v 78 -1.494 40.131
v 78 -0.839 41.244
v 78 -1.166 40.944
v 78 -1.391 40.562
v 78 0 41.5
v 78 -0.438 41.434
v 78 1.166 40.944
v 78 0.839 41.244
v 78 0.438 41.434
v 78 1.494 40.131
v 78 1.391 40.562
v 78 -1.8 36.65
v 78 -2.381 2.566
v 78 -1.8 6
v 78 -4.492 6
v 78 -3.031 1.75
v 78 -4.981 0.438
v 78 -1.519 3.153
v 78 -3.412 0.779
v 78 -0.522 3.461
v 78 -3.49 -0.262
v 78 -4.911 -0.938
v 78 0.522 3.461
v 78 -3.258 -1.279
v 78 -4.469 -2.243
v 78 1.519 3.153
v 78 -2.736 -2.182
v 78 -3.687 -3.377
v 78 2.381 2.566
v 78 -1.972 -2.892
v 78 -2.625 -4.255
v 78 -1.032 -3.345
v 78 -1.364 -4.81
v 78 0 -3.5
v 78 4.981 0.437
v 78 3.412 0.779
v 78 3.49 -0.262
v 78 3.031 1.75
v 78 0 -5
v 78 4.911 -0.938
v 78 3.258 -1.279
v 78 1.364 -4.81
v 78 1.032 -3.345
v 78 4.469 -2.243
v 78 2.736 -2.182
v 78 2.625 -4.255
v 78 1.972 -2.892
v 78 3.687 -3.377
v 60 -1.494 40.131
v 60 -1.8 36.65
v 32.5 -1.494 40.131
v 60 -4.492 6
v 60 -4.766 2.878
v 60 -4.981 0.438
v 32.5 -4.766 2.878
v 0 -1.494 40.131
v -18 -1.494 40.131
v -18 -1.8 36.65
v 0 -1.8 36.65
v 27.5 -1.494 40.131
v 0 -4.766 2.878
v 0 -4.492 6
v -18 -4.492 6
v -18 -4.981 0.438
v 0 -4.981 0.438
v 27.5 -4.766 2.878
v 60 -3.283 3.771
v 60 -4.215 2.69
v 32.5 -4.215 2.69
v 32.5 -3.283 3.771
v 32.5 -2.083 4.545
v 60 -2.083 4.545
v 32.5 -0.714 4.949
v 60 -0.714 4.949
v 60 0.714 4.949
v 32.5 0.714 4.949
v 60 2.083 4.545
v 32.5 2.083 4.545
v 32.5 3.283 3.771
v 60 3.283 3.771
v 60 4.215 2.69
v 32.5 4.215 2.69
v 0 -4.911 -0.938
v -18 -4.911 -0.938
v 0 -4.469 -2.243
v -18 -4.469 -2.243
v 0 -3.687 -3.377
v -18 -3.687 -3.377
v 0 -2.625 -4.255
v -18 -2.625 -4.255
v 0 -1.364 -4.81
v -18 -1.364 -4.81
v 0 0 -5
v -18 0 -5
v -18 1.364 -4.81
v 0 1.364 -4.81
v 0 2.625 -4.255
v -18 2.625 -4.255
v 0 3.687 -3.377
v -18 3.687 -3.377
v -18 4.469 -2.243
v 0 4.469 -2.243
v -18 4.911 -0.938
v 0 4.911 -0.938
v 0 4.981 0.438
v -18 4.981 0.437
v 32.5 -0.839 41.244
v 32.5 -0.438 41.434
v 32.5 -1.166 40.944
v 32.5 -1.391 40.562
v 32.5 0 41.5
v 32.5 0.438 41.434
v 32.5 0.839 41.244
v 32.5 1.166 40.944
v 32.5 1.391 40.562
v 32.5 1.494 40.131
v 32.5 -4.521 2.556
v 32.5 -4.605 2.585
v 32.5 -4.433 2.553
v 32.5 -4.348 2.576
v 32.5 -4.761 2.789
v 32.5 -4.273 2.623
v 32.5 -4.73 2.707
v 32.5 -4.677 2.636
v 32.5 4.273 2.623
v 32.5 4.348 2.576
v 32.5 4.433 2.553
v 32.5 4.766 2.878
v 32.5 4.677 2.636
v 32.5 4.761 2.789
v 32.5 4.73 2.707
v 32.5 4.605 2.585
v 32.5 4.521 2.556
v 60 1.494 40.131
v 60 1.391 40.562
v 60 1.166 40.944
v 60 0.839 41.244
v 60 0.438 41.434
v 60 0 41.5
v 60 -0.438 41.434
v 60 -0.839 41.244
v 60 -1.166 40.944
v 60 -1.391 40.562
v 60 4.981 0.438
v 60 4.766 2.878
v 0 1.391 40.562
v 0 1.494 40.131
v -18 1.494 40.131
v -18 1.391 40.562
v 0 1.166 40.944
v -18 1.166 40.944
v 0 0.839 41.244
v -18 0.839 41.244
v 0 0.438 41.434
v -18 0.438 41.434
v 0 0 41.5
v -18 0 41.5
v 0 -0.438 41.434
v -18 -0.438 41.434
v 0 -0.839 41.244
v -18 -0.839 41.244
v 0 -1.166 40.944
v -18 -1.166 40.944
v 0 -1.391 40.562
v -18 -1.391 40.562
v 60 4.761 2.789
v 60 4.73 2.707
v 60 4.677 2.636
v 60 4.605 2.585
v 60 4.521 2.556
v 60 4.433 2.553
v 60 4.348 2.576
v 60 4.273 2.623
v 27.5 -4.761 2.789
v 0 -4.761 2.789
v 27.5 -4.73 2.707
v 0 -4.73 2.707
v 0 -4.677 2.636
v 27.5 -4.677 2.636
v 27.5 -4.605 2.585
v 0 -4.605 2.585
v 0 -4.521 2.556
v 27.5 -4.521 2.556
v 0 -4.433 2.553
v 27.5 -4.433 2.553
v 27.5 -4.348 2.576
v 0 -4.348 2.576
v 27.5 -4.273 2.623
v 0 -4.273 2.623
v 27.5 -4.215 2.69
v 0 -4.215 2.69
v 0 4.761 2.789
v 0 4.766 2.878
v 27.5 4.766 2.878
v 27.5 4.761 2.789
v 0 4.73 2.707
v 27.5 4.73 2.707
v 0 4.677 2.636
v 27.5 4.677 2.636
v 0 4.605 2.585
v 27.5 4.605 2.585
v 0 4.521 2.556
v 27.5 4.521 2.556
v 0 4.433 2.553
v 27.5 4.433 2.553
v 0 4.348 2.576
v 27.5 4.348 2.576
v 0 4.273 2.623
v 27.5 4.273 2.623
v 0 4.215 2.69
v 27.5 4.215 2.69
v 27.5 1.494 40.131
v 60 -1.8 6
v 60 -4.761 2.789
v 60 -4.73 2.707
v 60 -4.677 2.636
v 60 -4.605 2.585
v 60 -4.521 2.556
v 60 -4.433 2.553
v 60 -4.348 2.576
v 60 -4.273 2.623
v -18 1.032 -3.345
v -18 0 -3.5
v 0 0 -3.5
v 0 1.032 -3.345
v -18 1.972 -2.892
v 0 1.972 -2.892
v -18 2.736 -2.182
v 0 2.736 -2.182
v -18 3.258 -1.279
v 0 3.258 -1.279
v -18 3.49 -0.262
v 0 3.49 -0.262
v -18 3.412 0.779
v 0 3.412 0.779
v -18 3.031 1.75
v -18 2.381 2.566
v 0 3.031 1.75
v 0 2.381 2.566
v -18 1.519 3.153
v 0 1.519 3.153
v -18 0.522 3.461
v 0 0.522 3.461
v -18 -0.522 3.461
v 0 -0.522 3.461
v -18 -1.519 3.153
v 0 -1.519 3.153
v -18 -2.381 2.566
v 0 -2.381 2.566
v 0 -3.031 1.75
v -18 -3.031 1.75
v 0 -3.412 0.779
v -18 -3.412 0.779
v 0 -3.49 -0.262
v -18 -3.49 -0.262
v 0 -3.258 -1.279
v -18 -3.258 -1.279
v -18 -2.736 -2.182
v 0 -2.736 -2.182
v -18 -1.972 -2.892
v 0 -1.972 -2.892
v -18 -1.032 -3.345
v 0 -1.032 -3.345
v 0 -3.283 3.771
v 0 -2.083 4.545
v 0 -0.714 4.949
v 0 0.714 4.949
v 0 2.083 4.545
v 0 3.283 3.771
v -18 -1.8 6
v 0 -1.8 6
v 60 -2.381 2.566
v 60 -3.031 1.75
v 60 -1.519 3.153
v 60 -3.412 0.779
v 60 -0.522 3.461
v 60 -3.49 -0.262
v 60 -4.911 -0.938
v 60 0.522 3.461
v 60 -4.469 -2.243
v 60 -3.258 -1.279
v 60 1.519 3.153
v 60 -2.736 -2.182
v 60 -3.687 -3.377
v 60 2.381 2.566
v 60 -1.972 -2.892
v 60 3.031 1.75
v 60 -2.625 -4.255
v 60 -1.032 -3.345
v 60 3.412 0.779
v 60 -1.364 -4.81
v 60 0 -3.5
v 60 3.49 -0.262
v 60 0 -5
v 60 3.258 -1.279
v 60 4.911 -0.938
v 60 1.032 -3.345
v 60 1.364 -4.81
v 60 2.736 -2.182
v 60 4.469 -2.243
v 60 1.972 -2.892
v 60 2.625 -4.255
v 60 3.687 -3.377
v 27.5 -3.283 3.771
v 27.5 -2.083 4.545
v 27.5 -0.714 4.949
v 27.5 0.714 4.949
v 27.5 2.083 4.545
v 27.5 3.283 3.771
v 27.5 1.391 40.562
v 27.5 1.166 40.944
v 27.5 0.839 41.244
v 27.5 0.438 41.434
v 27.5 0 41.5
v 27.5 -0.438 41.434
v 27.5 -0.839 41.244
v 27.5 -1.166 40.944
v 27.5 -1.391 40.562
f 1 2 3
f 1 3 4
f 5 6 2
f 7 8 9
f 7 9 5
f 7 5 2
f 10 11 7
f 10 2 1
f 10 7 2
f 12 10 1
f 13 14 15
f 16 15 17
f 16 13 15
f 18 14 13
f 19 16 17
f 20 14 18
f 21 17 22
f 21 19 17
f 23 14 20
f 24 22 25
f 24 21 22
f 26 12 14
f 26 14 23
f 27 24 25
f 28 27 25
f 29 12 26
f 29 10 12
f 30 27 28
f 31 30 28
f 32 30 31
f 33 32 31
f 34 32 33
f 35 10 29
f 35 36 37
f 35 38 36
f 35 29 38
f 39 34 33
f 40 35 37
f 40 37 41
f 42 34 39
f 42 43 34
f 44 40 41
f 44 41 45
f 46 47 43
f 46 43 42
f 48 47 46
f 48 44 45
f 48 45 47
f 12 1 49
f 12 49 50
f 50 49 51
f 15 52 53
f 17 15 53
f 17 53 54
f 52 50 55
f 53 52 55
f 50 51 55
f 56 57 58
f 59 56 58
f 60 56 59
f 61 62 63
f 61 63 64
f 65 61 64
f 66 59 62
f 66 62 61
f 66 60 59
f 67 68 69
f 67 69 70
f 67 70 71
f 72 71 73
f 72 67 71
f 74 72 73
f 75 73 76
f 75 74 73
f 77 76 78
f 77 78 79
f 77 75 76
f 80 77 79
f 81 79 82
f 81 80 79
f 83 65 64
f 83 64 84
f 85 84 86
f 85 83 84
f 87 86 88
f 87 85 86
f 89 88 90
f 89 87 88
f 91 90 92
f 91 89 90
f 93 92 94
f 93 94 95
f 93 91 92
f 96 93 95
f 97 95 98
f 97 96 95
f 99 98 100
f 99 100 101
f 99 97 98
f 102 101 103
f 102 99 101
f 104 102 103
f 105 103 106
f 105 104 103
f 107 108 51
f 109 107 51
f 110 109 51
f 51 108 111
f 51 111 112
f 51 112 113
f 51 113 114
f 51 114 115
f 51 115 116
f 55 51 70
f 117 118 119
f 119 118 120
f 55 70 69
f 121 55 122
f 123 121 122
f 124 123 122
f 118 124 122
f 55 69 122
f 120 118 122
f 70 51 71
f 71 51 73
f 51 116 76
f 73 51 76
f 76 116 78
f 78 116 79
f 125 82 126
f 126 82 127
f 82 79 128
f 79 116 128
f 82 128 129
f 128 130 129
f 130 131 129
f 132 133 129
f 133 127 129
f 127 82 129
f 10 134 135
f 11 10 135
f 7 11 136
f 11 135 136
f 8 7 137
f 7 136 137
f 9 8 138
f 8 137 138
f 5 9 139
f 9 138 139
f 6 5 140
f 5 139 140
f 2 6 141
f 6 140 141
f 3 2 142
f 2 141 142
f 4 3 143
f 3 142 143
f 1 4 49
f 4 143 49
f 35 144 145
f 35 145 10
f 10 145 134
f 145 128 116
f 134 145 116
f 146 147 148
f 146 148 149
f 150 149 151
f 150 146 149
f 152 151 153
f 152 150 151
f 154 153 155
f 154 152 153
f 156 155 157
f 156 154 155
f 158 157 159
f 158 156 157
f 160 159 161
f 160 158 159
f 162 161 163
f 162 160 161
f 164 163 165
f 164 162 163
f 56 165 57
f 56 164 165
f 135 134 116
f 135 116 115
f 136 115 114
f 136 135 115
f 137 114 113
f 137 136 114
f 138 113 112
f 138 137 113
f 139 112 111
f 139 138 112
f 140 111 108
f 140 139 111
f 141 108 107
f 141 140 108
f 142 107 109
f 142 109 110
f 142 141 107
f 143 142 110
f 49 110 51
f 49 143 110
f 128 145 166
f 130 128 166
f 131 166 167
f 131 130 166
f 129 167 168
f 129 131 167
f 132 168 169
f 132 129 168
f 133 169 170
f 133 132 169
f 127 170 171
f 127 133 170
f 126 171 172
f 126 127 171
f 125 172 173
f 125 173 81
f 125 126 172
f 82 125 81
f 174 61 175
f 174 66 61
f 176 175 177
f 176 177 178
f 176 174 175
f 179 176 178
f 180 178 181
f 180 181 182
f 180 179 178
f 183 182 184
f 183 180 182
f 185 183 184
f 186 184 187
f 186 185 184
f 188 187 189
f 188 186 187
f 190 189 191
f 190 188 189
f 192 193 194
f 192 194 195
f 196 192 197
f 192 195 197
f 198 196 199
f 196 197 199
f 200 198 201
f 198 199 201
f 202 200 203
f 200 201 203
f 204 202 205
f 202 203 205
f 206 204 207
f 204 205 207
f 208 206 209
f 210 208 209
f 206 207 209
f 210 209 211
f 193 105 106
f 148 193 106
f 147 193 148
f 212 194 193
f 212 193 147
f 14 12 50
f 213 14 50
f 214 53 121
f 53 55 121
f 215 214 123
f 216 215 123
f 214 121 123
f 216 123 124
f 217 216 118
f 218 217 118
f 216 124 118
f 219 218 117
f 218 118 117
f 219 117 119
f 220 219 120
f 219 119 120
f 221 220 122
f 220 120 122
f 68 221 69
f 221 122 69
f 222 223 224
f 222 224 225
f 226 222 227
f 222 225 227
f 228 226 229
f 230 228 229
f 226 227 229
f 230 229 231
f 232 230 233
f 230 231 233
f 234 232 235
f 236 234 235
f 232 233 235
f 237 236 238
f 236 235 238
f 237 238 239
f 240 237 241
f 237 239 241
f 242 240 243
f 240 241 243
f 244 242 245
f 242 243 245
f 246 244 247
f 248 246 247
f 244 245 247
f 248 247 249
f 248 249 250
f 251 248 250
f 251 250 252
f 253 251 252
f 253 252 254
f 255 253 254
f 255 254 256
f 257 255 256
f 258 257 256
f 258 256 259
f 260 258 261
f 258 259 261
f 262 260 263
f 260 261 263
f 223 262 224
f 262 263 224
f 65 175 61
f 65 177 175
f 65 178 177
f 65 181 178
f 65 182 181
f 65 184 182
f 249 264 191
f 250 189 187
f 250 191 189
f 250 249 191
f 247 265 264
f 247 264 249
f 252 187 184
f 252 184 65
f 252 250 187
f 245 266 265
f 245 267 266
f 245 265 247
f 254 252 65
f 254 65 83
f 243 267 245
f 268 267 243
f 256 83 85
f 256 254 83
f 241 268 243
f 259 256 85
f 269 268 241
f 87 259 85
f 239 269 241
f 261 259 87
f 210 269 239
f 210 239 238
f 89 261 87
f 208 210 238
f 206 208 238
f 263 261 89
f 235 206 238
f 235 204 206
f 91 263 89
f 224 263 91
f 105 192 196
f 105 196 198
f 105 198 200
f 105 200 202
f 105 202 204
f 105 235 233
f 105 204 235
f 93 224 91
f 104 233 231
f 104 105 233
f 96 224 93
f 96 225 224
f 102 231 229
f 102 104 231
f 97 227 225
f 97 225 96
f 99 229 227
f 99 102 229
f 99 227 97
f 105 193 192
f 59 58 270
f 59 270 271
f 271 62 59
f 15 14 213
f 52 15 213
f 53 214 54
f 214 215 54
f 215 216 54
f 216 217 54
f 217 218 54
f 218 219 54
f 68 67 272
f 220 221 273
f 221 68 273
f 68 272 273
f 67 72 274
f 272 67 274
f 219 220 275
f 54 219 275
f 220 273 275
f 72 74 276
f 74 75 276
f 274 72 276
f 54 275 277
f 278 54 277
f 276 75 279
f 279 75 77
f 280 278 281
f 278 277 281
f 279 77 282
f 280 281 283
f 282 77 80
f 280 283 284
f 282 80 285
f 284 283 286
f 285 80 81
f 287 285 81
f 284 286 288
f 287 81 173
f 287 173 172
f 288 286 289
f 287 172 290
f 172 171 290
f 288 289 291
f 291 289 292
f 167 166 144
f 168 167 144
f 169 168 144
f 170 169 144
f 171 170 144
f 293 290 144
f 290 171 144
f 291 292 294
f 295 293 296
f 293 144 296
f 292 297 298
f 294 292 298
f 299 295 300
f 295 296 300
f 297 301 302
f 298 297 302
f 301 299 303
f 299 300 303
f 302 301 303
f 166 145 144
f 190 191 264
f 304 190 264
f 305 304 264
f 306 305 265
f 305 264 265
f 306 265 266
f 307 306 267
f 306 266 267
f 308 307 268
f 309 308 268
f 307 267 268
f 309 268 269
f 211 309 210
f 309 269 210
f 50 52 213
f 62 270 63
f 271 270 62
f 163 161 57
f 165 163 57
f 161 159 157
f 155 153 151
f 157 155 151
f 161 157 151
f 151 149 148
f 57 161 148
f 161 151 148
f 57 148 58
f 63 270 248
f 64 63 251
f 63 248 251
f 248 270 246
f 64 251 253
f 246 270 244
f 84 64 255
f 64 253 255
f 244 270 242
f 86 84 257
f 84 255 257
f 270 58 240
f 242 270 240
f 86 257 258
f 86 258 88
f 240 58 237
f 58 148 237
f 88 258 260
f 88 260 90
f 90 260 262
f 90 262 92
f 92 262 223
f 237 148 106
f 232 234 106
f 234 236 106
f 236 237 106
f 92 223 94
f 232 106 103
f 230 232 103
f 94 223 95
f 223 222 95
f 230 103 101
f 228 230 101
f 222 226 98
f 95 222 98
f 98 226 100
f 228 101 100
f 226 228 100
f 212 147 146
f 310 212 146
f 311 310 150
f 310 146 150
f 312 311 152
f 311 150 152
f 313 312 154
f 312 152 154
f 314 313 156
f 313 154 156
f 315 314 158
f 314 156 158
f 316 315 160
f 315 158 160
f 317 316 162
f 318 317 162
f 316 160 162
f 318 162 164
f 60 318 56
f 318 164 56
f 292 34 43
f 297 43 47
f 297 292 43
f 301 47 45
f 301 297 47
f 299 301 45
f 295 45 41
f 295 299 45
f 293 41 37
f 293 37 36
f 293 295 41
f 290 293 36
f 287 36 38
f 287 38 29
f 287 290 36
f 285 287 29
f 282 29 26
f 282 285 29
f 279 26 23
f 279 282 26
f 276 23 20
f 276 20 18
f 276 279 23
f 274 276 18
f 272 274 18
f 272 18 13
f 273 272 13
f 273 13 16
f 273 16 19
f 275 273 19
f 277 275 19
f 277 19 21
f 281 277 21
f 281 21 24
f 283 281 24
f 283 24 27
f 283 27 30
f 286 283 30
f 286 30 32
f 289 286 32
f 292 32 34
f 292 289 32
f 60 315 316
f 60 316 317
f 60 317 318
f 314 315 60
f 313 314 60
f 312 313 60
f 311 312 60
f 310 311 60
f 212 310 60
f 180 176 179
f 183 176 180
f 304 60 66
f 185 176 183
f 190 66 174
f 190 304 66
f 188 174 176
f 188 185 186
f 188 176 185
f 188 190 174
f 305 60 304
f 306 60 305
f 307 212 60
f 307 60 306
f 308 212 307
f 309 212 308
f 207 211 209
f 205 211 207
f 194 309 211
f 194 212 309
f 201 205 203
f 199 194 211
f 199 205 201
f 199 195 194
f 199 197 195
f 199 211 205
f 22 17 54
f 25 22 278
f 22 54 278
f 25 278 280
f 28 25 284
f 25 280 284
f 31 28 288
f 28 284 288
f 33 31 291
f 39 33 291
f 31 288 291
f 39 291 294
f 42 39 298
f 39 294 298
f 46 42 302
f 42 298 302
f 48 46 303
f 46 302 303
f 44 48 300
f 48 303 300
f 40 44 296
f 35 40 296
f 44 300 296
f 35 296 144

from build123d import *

# Parameters (mm, degrees)
BOSS_EXTRUDE1_DEPTH = 27.5
BOSS_EXTRUDE2_START = -18
SKETCH1_3_R         = 3.5
BOSS_EXTRUDE2_DEPTH = 18
FILLET1_R           = 0.3
CUT_EXTRUDE1_START  = 6
SKETCH2_W           = 18
SKETCH2_H           = 4.33028374
CUT_EXTRUDE1_DEPTH  = 48


with BuildPart() as part:
    # Sketch1 → Boss-Extrude1 (new body)
    with BuildSketch(Plane(origin=(0, 0, 0), x_dir=(0, 0, -1), z_dir=(1, 0, 0))):
        with BuildLine():
            Line((-0.4375, 4.980822598), (-40.13125, 1.494246779))
            ThreePointArc((-40.13125, 1.494246779), (-41.5, 0), (-40.13125, -1.494246779))
            Line((-40.13125, -1.494246779), (-0.4375, -4.980822598))
            ThreePointArc((-0.4375, -4.980822598), (-5, 0), (-0.4375, 4.980822598))
        make_face()
    extrude(amount=BOSS_EXTRUDE1_DEPTH)

    # Sketch1<3> → Boss-Extrude2 (add)
    with BuildSketch(Plane(origin=(0, 0, 0), x_dir=(0, 0, -1), z_dir=(1, 0, 0)).offset(BOSS_EXTRUDE2_START)):
        with BuildLine():
            Line((-0.4375, 4.980822598), (-40.13125, 1.494246779))
            ThreePointArc((-40.13125, 1.494246779), (-41.5, 0), (-40.13125, -1.494246779))
            Line((-40.13125, -1.494246779), (-0.4375, -4.980822598))
            ThreePointArc((-0.4375, -4.980822598), (5, 0), (-0.4375, 4.980822598))
        make_face()
        Circle(SKETCH1_3_R, mode=Mode.SUBTRACT)
    extrude(amount=BOSS_EXTRUDE2_DEPTH)

    # Fillet1
    fillet1_edges = [part.edges().sort_by_distance(p)[0] for p in [
        (13.75, -4.980822598, 0.4375),
        (13.75, 4.980822598, 0.4375),
    ]]
    fillet(fillet1_edges, radius=FILLET1_R)

    # Sketch2 → Cut-Extrude1 (cut)
    with BuildSketch(Plane.XY.offset(CUT_EXTRUDE1_START)):
        with Locations((-9, -3.96514187)):
            Rectangle(SKETCH2_W, SKETCH2_H)
    extrude(amount=CUT_EXTRUDE1_DEPTH, mode=Mode.SUBTRACT)


with BuildPart() as body_2:
    # Mirror2: mirrored copy
    add(part.part.mirror(Plane(origin=(30, 0, 0), x_dir=(0, 0, 1), z_dir=(1, 0, 0))))


solid = Compound([part.part, body_2.part])
